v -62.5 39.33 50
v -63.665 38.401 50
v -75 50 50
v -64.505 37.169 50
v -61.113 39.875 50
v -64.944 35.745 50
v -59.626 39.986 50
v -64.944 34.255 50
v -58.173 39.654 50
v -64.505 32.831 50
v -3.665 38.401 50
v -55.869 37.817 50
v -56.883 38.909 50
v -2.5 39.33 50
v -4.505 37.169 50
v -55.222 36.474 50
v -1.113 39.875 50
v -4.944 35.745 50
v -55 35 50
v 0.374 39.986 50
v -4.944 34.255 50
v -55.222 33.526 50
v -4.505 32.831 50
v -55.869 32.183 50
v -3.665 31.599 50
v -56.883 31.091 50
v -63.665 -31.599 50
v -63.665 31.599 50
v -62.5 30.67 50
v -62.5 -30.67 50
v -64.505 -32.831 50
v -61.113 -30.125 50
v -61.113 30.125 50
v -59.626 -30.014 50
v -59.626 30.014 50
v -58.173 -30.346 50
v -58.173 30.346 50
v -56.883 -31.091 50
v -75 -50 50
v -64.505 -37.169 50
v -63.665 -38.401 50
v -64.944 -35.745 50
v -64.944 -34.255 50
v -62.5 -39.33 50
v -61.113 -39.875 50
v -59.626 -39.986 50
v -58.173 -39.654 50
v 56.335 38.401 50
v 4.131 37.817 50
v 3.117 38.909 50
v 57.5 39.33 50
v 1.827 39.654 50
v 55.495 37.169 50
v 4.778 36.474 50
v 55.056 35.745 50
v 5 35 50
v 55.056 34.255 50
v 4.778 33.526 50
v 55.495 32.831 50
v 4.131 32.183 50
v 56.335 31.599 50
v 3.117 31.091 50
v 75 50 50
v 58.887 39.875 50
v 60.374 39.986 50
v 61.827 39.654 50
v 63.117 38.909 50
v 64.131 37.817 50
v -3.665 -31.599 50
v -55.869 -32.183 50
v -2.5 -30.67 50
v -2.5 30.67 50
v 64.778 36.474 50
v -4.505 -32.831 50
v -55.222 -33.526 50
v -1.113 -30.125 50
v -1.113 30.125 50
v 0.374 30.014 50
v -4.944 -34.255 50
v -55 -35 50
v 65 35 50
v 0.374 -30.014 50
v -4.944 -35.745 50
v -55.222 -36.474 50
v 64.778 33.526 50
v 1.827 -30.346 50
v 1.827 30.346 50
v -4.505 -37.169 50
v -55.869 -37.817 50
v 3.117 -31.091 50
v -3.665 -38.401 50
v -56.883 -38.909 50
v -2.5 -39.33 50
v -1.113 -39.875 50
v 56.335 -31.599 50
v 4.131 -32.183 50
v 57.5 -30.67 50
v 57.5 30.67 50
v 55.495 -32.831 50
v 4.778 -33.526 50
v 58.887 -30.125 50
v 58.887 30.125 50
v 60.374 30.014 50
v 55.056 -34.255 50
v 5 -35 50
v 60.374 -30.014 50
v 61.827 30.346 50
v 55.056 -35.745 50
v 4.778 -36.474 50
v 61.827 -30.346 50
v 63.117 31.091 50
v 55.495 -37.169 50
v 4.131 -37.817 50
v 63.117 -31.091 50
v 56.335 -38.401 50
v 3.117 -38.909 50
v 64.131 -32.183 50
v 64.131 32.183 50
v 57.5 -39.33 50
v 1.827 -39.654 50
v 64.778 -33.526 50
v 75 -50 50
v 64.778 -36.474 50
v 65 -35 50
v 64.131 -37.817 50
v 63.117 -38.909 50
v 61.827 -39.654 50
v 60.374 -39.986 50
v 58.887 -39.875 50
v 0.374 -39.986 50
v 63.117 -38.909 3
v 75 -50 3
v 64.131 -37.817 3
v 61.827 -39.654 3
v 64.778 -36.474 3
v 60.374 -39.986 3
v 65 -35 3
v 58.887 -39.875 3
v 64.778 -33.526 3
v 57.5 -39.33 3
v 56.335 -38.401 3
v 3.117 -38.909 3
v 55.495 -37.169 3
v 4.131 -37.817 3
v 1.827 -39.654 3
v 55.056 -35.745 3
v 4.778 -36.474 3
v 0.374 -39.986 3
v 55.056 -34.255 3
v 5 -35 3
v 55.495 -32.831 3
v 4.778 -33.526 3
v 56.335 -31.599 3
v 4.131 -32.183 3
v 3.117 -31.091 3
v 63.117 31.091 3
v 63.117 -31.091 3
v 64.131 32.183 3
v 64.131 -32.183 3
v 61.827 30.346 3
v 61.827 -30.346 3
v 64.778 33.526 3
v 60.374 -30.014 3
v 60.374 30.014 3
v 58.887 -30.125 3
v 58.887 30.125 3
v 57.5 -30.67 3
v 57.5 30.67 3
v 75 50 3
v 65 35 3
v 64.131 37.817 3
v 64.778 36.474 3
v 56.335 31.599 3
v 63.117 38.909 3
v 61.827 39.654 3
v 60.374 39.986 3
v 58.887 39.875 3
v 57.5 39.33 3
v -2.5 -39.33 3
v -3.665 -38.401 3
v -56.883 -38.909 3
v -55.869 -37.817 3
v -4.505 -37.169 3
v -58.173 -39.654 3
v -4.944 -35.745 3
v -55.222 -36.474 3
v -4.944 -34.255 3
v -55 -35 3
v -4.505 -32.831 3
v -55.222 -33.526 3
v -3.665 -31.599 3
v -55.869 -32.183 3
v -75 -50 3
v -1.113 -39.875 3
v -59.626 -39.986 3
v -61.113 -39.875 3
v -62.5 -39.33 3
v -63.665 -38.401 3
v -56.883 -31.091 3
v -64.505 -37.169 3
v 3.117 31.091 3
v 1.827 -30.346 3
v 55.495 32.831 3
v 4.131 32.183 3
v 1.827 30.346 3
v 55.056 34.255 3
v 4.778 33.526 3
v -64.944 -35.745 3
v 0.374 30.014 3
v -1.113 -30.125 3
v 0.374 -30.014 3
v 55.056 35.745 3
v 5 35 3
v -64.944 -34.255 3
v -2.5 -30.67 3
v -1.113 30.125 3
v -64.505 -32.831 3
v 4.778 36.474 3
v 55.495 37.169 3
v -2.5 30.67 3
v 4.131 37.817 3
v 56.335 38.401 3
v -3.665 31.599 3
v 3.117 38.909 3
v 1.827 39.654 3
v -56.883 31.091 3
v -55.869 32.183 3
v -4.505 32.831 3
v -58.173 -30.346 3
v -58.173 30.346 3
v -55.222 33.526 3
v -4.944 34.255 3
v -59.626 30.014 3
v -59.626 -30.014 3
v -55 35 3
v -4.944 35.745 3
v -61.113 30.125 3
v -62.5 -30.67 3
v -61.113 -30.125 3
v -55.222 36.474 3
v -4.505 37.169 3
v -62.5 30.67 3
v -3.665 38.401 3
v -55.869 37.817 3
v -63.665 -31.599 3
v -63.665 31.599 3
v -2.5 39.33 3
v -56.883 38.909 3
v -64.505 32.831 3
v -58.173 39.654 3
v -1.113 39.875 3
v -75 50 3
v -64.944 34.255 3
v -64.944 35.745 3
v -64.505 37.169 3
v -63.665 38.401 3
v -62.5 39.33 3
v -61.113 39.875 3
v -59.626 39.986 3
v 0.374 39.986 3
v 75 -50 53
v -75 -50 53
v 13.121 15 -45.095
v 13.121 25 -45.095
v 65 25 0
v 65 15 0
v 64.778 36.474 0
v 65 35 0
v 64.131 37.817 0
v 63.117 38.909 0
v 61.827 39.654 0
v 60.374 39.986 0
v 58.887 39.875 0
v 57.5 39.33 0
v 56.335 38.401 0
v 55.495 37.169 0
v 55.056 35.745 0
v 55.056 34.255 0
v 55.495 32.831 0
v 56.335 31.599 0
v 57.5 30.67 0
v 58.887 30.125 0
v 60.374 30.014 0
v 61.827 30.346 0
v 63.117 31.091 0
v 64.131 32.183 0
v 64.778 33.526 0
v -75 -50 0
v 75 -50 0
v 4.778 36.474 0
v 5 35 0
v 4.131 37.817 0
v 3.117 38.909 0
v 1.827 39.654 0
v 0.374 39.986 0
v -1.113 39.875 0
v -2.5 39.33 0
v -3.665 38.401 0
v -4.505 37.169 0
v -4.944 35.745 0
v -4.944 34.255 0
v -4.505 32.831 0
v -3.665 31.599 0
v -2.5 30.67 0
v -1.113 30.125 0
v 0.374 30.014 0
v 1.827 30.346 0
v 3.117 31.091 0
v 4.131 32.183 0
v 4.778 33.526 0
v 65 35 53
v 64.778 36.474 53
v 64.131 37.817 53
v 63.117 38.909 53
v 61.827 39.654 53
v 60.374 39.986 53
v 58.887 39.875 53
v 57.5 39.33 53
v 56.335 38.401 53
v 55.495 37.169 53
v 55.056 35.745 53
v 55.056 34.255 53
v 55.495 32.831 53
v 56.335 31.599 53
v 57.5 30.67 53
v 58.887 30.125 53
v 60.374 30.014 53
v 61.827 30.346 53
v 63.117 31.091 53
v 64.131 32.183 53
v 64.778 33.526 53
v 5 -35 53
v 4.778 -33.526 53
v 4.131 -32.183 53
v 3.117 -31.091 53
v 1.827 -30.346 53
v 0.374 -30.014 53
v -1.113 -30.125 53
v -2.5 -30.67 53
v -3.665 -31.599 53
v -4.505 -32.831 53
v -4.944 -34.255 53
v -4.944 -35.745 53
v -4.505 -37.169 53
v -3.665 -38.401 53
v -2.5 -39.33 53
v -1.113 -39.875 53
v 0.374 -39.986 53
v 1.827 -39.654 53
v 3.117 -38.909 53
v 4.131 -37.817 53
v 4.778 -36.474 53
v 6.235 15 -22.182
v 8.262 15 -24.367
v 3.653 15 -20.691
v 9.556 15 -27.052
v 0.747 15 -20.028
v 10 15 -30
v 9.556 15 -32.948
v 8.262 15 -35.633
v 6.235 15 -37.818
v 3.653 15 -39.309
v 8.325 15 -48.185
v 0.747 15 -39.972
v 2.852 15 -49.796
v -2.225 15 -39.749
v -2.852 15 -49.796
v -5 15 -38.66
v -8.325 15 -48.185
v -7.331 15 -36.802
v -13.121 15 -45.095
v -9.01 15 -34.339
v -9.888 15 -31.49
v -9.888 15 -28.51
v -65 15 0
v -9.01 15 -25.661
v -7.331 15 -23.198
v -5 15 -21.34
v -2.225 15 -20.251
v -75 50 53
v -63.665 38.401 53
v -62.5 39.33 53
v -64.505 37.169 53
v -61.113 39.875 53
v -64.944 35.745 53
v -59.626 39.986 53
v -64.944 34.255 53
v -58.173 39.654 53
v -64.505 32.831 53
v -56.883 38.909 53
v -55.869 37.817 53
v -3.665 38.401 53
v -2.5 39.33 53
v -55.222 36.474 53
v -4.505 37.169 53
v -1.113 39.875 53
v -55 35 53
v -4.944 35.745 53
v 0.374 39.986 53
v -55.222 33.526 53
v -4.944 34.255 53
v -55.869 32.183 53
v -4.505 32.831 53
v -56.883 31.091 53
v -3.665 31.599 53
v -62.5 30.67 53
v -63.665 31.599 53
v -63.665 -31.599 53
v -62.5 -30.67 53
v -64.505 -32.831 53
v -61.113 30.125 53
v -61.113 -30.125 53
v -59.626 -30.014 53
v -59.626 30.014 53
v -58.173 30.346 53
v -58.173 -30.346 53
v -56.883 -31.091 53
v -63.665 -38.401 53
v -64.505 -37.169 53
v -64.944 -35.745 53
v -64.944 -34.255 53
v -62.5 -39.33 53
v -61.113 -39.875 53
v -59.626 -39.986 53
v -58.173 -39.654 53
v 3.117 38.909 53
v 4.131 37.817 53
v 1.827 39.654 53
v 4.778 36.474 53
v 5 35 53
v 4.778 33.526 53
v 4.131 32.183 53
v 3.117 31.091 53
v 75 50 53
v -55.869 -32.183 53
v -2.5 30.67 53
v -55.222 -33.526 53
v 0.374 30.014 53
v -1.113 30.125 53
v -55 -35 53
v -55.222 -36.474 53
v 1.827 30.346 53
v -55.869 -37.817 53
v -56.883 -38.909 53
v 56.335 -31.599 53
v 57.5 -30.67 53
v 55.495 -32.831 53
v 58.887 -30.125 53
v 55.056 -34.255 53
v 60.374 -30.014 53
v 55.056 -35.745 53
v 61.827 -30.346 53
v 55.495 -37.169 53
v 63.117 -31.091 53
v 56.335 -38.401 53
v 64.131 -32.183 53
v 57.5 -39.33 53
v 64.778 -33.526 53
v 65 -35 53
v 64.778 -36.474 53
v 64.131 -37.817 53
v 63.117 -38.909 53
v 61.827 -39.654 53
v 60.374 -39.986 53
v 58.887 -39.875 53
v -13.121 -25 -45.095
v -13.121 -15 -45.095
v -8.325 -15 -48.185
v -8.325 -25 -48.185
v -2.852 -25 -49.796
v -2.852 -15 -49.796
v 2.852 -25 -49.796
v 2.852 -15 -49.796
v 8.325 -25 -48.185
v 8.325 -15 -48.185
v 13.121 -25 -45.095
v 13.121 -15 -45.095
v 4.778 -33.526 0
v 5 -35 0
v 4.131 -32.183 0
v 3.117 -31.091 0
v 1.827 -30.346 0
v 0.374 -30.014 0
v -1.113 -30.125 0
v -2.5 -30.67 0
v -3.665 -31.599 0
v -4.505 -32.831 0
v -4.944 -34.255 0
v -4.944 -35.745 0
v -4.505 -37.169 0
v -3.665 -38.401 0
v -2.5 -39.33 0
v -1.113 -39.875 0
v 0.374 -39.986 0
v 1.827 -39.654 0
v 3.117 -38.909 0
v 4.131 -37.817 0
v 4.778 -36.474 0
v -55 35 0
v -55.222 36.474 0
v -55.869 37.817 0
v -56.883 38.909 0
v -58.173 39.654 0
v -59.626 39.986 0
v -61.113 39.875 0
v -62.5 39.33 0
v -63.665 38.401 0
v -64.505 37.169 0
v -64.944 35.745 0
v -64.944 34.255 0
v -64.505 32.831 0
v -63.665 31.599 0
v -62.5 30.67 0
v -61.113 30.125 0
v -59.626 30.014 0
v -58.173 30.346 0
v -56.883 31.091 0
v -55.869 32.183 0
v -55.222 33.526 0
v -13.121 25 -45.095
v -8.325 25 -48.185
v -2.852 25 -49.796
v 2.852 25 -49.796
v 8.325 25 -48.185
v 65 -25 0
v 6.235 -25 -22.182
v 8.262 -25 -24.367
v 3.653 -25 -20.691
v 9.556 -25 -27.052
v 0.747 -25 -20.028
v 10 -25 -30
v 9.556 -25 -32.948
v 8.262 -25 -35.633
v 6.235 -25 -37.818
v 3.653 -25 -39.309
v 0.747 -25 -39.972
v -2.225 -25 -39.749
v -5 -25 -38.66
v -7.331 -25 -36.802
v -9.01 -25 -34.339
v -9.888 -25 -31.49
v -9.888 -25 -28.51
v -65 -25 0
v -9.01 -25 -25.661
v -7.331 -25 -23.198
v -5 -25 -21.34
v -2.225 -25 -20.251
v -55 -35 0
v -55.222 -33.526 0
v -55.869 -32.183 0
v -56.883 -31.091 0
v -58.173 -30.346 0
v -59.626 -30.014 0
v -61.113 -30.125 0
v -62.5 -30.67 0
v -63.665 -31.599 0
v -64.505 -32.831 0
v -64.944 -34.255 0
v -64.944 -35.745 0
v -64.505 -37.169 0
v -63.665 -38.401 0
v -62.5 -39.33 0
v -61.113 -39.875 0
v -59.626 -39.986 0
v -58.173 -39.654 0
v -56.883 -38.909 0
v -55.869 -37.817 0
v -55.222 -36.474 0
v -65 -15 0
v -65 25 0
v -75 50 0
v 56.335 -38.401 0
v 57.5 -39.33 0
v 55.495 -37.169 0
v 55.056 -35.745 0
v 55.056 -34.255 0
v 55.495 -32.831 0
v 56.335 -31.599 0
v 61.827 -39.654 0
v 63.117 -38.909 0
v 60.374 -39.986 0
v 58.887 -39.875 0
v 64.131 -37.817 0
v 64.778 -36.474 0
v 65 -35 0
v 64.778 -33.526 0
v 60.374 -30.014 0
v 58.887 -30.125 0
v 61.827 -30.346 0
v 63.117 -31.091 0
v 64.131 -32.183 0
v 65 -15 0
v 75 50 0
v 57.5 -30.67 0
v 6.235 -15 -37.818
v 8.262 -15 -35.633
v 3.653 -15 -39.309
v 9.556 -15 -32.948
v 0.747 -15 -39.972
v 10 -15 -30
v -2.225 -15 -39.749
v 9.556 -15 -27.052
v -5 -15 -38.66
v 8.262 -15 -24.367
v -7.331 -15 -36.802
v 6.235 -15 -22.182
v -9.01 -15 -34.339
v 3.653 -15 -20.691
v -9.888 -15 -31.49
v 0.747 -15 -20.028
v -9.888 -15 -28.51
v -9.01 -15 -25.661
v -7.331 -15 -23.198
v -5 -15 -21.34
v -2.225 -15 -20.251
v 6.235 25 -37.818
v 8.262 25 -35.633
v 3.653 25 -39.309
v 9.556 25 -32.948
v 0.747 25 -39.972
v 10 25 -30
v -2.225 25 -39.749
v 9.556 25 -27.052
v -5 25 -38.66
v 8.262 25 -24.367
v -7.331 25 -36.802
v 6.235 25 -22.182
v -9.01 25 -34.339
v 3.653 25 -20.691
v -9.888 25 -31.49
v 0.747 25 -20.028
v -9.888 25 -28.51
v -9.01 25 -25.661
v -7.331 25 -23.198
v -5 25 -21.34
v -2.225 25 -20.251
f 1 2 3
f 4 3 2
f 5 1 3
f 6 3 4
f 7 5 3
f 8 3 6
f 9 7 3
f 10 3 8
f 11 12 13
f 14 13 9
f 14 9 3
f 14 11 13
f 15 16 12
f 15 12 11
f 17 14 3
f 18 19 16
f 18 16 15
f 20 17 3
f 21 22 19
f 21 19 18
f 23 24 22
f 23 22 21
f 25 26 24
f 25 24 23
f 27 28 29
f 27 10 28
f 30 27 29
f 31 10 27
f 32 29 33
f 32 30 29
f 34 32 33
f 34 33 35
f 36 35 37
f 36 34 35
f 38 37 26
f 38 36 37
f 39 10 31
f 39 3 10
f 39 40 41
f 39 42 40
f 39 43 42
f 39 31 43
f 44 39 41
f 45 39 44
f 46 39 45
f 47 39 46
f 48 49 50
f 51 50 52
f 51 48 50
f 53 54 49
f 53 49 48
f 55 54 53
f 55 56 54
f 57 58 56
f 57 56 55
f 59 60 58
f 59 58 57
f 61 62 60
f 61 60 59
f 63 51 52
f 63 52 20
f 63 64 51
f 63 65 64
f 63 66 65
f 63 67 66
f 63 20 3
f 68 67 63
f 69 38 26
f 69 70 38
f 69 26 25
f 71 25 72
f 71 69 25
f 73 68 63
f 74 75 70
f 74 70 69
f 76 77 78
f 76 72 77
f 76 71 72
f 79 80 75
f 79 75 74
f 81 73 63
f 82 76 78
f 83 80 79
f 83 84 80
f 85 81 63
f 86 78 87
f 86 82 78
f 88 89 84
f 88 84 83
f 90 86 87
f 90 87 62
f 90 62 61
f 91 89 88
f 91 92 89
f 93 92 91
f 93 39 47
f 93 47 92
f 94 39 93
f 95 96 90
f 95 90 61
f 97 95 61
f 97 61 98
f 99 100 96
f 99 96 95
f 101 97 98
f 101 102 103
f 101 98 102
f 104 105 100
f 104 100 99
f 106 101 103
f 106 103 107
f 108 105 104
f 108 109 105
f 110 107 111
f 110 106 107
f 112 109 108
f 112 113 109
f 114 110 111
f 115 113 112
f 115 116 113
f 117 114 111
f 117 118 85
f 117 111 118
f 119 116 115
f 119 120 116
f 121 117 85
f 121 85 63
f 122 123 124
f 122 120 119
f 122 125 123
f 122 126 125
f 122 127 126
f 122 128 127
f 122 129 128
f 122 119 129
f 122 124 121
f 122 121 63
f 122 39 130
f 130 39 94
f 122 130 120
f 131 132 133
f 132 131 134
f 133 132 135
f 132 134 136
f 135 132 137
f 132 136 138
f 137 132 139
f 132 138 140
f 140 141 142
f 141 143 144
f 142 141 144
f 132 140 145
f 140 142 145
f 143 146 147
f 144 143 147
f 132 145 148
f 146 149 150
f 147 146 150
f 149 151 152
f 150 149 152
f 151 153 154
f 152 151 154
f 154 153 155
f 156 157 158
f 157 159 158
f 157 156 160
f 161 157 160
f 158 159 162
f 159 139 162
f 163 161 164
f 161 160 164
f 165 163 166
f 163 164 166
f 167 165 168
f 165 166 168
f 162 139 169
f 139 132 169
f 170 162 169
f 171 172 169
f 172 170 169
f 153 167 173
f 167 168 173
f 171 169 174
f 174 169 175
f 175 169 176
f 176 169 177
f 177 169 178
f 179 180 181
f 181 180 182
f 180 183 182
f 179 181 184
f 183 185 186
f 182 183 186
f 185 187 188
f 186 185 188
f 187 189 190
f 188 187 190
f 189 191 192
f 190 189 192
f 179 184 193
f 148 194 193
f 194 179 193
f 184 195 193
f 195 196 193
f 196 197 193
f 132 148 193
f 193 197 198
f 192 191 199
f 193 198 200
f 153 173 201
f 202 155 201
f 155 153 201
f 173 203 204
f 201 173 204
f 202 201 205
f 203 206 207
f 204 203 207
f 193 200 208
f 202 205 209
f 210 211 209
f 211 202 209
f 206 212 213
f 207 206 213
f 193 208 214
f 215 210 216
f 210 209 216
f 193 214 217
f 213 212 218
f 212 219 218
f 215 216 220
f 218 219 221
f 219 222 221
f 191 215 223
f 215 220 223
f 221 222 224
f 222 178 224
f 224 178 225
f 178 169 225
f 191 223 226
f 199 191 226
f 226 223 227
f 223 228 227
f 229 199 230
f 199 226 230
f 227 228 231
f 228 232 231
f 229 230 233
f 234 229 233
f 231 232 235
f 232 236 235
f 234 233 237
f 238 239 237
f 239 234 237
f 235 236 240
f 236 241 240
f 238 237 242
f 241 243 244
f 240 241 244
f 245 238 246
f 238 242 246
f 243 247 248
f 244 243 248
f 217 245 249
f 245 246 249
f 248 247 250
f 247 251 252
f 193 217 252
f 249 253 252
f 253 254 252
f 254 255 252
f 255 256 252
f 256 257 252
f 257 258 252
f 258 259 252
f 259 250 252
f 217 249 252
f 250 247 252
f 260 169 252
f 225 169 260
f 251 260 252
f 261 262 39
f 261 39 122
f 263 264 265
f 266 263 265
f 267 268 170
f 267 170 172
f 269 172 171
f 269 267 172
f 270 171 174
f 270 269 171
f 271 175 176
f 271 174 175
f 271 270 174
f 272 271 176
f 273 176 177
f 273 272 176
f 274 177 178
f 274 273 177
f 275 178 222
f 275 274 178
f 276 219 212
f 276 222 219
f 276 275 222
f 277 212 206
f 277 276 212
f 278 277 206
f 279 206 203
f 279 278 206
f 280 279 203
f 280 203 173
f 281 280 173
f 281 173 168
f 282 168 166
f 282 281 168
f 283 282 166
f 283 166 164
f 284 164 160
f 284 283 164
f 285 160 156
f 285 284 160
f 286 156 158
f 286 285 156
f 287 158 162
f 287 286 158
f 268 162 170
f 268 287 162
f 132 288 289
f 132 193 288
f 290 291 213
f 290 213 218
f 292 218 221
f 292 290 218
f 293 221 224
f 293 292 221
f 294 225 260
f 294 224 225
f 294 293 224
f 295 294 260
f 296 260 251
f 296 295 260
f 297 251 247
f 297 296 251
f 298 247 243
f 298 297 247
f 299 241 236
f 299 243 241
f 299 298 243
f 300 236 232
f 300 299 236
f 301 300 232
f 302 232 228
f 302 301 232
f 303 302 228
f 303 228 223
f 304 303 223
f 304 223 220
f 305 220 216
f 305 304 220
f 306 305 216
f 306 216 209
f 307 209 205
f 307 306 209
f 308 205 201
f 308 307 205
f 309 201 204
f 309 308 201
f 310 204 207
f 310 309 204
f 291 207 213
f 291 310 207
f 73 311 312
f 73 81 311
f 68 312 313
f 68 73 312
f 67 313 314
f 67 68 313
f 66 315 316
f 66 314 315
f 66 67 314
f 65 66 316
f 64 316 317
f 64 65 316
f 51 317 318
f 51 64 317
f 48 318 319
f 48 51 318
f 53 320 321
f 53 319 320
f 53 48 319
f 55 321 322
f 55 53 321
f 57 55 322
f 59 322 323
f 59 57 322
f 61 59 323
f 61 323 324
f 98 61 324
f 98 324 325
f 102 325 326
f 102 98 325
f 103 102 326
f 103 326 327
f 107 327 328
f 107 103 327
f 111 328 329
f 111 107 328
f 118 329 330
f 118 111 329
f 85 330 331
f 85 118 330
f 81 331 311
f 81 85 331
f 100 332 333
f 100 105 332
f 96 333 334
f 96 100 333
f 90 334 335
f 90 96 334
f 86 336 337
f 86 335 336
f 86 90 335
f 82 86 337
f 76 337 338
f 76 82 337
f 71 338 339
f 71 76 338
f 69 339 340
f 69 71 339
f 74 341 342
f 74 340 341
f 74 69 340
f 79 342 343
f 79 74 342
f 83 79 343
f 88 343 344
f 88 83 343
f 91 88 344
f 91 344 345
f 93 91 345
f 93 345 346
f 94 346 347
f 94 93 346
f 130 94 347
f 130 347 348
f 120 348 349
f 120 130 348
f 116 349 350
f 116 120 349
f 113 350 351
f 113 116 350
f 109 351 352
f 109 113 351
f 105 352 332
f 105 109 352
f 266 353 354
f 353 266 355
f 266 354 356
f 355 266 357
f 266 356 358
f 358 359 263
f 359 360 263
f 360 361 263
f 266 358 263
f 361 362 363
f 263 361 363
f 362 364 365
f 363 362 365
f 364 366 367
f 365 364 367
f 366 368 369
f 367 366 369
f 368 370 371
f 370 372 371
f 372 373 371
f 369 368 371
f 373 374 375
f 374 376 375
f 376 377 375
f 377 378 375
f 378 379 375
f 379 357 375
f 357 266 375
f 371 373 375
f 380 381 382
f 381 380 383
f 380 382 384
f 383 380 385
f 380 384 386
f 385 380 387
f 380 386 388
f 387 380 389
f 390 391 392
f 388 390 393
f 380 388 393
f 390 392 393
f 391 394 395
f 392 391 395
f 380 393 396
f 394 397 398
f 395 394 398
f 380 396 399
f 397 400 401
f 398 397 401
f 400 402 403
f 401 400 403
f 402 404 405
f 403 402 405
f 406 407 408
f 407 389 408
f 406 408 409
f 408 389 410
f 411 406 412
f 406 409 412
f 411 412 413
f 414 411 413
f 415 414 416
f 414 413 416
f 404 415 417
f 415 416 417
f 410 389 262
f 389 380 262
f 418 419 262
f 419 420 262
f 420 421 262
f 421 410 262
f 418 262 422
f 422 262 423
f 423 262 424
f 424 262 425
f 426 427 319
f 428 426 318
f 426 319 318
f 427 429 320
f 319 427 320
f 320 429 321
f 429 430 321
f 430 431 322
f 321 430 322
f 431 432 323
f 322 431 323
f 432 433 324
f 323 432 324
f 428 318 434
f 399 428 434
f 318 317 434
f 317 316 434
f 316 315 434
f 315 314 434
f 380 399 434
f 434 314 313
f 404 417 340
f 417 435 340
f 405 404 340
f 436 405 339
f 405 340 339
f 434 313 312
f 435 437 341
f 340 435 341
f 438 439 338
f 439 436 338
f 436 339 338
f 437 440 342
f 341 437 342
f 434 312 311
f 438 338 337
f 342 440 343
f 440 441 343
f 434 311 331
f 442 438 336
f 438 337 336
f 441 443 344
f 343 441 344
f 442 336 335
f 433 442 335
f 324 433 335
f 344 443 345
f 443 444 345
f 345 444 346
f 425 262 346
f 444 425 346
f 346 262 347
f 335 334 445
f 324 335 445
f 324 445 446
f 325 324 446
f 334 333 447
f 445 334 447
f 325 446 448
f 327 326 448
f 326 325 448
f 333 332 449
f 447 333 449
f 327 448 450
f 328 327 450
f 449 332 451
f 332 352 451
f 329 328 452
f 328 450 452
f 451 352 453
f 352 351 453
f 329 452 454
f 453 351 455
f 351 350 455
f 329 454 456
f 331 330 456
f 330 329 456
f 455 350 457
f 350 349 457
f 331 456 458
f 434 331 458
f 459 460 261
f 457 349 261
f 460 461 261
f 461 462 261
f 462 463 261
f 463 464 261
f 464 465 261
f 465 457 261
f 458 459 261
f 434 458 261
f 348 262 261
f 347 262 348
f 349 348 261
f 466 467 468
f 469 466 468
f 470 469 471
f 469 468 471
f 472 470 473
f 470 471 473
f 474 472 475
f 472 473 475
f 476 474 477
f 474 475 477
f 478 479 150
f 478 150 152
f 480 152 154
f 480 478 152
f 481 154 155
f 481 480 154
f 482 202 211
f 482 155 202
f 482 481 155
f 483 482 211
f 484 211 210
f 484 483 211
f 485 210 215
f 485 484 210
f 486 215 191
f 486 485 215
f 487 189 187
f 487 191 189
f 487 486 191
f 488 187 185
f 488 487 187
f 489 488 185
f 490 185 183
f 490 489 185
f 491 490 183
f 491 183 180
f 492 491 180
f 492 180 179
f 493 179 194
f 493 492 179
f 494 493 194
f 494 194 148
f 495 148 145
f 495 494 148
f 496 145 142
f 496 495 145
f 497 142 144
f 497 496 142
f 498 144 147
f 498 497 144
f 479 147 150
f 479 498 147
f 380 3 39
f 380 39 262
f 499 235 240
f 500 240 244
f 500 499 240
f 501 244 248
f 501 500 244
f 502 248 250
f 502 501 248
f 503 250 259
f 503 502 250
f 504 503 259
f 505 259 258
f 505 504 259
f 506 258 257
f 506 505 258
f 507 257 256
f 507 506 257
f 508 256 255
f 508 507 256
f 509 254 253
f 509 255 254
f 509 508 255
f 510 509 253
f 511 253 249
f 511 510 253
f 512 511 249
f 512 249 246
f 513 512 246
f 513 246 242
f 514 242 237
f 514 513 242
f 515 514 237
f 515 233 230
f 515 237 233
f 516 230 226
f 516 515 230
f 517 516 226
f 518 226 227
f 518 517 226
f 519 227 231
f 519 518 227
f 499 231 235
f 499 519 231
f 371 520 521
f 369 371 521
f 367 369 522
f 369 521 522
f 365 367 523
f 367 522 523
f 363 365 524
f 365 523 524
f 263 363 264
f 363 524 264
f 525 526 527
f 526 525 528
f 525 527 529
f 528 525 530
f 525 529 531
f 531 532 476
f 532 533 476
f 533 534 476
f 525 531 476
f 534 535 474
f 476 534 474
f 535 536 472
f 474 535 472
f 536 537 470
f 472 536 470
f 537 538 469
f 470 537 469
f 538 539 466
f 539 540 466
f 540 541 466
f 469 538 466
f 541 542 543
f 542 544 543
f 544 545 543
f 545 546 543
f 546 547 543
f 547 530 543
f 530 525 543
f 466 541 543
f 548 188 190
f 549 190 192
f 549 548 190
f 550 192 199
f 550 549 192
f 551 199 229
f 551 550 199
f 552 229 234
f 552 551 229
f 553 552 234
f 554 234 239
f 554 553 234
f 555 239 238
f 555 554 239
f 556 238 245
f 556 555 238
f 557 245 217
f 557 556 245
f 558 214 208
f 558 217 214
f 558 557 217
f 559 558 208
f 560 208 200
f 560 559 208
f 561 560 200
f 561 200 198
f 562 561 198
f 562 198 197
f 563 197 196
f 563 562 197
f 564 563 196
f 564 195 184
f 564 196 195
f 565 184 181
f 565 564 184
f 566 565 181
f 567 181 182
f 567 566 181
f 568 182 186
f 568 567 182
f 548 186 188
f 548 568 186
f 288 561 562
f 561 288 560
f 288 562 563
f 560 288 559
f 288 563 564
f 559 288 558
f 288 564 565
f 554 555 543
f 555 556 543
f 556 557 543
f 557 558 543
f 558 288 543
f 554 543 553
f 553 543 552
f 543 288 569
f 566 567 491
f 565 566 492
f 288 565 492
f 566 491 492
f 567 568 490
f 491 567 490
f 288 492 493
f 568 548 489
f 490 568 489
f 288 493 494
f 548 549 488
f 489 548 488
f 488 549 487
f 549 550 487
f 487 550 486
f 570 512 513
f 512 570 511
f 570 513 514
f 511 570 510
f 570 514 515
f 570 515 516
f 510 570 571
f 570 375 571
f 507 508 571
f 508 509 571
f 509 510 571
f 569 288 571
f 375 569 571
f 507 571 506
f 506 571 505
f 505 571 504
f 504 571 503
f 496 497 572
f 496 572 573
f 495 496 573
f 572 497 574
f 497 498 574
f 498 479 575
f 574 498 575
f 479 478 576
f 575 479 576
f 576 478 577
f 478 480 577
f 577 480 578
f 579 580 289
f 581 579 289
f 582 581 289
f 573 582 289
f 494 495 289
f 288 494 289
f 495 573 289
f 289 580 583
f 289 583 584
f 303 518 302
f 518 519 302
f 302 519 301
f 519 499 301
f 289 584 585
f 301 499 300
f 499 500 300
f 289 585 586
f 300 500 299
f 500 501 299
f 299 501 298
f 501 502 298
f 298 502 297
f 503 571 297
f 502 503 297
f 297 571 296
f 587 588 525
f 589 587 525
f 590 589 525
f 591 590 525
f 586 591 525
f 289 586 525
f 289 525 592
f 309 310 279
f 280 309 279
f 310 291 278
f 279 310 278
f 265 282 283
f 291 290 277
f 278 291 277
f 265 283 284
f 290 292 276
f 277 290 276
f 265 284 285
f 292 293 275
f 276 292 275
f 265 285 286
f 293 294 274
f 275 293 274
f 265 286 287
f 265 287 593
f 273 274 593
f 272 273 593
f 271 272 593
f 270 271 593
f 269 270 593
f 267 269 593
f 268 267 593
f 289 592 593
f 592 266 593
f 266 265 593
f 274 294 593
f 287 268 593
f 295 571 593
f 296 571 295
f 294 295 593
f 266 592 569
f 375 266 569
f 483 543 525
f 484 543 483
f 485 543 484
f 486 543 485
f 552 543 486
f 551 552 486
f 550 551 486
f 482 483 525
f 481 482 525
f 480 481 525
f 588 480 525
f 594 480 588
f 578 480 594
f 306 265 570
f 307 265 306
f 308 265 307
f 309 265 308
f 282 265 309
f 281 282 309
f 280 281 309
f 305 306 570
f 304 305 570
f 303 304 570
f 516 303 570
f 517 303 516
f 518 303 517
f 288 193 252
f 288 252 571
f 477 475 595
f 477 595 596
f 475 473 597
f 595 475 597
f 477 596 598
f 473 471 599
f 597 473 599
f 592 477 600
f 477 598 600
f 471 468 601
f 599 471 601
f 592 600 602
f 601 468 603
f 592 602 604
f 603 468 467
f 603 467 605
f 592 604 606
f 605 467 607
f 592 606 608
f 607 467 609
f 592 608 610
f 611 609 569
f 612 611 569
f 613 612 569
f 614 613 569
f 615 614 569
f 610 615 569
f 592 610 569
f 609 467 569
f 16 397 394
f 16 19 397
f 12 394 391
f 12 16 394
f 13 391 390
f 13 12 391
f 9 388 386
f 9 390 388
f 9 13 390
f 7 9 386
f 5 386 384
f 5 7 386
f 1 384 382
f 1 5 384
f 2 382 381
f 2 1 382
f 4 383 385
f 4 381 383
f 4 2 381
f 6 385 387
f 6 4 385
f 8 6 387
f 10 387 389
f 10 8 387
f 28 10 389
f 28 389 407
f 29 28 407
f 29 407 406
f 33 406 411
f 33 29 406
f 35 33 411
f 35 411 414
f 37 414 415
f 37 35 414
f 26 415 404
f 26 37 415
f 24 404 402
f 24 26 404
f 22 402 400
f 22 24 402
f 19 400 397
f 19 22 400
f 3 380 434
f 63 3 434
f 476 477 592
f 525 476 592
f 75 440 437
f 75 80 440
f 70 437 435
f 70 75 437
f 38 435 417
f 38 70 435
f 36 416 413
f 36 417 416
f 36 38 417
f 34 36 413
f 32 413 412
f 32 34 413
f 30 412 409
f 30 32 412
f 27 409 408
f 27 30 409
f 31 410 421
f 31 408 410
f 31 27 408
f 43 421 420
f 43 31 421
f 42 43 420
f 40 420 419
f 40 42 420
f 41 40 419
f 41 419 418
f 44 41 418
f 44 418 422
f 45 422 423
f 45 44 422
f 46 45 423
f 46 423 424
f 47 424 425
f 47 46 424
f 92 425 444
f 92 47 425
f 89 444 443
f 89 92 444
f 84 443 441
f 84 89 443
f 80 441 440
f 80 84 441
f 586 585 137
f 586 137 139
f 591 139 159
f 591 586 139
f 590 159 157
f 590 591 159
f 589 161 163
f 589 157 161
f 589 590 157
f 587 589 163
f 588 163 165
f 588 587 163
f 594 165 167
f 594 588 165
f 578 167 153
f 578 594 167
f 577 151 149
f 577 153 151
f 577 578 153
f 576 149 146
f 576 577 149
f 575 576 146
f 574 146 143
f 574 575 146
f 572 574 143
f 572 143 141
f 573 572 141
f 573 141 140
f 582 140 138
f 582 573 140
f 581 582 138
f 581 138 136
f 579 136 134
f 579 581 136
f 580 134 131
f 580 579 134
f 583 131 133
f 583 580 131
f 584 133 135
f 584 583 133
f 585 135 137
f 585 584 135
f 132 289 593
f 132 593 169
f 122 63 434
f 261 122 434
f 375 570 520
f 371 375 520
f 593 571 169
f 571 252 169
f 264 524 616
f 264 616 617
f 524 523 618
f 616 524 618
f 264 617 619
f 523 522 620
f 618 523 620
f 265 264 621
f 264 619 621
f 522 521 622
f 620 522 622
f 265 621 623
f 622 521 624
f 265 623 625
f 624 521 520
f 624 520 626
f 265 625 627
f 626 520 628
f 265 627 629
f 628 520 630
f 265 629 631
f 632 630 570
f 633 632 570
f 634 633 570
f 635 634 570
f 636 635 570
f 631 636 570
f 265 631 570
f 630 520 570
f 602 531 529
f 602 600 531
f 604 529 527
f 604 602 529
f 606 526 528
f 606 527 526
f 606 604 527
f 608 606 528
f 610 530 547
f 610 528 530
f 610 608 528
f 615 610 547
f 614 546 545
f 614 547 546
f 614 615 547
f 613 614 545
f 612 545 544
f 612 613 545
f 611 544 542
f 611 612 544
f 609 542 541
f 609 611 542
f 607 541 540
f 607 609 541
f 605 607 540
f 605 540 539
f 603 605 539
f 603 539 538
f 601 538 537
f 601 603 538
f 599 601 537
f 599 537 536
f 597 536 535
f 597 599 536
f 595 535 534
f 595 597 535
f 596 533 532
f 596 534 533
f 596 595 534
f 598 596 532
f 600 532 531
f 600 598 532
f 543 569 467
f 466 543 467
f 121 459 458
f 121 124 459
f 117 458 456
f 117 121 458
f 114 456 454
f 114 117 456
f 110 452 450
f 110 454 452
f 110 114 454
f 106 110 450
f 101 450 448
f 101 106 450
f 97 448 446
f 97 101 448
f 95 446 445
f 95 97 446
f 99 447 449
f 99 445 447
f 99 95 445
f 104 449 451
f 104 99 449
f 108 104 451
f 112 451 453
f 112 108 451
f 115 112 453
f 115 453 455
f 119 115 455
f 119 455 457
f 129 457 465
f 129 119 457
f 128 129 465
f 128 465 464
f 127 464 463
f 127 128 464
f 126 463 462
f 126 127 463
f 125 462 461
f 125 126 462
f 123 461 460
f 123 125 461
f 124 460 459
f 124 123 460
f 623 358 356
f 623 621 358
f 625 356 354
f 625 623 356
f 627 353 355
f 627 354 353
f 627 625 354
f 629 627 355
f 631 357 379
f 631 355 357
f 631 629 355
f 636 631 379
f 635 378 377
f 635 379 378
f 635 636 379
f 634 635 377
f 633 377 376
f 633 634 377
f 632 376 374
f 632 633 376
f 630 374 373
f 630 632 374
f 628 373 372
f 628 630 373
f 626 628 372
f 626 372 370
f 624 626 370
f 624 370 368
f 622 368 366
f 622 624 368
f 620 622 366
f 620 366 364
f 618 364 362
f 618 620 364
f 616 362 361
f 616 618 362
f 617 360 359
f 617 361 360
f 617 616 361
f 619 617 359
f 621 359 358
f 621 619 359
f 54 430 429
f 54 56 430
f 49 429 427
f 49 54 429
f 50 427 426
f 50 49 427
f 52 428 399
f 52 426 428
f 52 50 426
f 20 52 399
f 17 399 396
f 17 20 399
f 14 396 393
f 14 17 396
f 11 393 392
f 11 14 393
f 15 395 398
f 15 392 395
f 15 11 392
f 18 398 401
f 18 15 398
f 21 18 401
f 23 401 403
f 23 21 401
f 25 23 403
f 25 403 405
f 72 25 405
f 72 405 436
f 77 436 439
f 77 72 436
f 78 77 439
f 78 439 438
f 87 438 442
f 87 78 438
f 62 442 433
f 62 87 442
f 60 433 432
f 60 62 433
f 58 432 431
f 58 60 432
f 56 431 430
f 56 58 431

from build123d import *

# Parameters (mm, degrees)
F0_W     = 150
F0_H     = 100
F0_R     = 5
F3_DEPTH = 224
F2_R     = 10
F2_W     = 150
F2_H     = 3
F4_DEPTH = 50
F1_W     = 110
F1_H     = 3
F5_DEPTH = 630


with BuildPart() as f3:
    # F0 (on Top) → F3 (new body, symmetric)
    with BuildSketch(Plane.XY):
        Rectangle(F0_W, F0_H)
        with Locations((-60, -35)):
            Circle(F0_R, mode=Mode.SUBTRACT)
        with Locations((0, -35)):
            Circle(F0_R, mode=Mode.SUBTRACT)
        with Locations((60, -35)):
            Circle(F0_R, mode=Mode.SUBTRACT)
        with Locations((-60, 35)):
            Circle(F0_R, mode=Mode.SUBTRACT)
        with Locations((0, 35)):
            Circle(F0_R, mode=Mode.SUBTRACT)
        with Locations((60, 35)):
            Circle(F0_R, mode=Mode.SUBTRACT)
    extrude(amount=F3_DEPTH, both=True)

    # F2 (on Front) → F4 (intersect, symmetric)
    with BuildSketch(Plane.XZ):
        with BuildLine():
            ThreePointArc((-13.1206207326, -45.094678254), (0, -50), (13.1206207326, -45.094678254))
            Line((13.1206207326, -45.094678254), (65, 0))
            Line((65, 0), (20, 0))
            Line((20, 0), (-20, 0))
            Line((-20, 0), (-65, 0))
            Line((-65, 0), (-13.1206207326, -45.094678254))
        make_face()
        with Locations((0, -30)):
            Circle(F2_R, mode=Mode.SUBTRACT)
        Polygon((20, 0), (65, 0), (75, 0), (75, 3), (-75, 3), (-75, 0), (-65, 0), (-20, 0), align=None)
        with Locations((0, 51.5)):
            Rectangle(F2_W, F2_H)
    extrude(amount=F4_DEPTH, both=True, mode=Mode.INTERSECT)

    # F1 (on Right) → F5 (intersect, symmetric)
    with BuildSketch(Plane.YZ):
        Polygon((-15, -100), (-15, 0), (15, 0), (15, -100), (25, -100), (25, 0), (55, 0), (55, 3), (-55, 3), (-55, 0), (-25, 0), (-25, -100), align=None)
        with Locations((0, 51.5)):
            Rectangle(F1_W, F1_H)
    extrude(amount=F5_DEPTH, both=True, mode=Mode.INTERSECT)


solid = f3.part
